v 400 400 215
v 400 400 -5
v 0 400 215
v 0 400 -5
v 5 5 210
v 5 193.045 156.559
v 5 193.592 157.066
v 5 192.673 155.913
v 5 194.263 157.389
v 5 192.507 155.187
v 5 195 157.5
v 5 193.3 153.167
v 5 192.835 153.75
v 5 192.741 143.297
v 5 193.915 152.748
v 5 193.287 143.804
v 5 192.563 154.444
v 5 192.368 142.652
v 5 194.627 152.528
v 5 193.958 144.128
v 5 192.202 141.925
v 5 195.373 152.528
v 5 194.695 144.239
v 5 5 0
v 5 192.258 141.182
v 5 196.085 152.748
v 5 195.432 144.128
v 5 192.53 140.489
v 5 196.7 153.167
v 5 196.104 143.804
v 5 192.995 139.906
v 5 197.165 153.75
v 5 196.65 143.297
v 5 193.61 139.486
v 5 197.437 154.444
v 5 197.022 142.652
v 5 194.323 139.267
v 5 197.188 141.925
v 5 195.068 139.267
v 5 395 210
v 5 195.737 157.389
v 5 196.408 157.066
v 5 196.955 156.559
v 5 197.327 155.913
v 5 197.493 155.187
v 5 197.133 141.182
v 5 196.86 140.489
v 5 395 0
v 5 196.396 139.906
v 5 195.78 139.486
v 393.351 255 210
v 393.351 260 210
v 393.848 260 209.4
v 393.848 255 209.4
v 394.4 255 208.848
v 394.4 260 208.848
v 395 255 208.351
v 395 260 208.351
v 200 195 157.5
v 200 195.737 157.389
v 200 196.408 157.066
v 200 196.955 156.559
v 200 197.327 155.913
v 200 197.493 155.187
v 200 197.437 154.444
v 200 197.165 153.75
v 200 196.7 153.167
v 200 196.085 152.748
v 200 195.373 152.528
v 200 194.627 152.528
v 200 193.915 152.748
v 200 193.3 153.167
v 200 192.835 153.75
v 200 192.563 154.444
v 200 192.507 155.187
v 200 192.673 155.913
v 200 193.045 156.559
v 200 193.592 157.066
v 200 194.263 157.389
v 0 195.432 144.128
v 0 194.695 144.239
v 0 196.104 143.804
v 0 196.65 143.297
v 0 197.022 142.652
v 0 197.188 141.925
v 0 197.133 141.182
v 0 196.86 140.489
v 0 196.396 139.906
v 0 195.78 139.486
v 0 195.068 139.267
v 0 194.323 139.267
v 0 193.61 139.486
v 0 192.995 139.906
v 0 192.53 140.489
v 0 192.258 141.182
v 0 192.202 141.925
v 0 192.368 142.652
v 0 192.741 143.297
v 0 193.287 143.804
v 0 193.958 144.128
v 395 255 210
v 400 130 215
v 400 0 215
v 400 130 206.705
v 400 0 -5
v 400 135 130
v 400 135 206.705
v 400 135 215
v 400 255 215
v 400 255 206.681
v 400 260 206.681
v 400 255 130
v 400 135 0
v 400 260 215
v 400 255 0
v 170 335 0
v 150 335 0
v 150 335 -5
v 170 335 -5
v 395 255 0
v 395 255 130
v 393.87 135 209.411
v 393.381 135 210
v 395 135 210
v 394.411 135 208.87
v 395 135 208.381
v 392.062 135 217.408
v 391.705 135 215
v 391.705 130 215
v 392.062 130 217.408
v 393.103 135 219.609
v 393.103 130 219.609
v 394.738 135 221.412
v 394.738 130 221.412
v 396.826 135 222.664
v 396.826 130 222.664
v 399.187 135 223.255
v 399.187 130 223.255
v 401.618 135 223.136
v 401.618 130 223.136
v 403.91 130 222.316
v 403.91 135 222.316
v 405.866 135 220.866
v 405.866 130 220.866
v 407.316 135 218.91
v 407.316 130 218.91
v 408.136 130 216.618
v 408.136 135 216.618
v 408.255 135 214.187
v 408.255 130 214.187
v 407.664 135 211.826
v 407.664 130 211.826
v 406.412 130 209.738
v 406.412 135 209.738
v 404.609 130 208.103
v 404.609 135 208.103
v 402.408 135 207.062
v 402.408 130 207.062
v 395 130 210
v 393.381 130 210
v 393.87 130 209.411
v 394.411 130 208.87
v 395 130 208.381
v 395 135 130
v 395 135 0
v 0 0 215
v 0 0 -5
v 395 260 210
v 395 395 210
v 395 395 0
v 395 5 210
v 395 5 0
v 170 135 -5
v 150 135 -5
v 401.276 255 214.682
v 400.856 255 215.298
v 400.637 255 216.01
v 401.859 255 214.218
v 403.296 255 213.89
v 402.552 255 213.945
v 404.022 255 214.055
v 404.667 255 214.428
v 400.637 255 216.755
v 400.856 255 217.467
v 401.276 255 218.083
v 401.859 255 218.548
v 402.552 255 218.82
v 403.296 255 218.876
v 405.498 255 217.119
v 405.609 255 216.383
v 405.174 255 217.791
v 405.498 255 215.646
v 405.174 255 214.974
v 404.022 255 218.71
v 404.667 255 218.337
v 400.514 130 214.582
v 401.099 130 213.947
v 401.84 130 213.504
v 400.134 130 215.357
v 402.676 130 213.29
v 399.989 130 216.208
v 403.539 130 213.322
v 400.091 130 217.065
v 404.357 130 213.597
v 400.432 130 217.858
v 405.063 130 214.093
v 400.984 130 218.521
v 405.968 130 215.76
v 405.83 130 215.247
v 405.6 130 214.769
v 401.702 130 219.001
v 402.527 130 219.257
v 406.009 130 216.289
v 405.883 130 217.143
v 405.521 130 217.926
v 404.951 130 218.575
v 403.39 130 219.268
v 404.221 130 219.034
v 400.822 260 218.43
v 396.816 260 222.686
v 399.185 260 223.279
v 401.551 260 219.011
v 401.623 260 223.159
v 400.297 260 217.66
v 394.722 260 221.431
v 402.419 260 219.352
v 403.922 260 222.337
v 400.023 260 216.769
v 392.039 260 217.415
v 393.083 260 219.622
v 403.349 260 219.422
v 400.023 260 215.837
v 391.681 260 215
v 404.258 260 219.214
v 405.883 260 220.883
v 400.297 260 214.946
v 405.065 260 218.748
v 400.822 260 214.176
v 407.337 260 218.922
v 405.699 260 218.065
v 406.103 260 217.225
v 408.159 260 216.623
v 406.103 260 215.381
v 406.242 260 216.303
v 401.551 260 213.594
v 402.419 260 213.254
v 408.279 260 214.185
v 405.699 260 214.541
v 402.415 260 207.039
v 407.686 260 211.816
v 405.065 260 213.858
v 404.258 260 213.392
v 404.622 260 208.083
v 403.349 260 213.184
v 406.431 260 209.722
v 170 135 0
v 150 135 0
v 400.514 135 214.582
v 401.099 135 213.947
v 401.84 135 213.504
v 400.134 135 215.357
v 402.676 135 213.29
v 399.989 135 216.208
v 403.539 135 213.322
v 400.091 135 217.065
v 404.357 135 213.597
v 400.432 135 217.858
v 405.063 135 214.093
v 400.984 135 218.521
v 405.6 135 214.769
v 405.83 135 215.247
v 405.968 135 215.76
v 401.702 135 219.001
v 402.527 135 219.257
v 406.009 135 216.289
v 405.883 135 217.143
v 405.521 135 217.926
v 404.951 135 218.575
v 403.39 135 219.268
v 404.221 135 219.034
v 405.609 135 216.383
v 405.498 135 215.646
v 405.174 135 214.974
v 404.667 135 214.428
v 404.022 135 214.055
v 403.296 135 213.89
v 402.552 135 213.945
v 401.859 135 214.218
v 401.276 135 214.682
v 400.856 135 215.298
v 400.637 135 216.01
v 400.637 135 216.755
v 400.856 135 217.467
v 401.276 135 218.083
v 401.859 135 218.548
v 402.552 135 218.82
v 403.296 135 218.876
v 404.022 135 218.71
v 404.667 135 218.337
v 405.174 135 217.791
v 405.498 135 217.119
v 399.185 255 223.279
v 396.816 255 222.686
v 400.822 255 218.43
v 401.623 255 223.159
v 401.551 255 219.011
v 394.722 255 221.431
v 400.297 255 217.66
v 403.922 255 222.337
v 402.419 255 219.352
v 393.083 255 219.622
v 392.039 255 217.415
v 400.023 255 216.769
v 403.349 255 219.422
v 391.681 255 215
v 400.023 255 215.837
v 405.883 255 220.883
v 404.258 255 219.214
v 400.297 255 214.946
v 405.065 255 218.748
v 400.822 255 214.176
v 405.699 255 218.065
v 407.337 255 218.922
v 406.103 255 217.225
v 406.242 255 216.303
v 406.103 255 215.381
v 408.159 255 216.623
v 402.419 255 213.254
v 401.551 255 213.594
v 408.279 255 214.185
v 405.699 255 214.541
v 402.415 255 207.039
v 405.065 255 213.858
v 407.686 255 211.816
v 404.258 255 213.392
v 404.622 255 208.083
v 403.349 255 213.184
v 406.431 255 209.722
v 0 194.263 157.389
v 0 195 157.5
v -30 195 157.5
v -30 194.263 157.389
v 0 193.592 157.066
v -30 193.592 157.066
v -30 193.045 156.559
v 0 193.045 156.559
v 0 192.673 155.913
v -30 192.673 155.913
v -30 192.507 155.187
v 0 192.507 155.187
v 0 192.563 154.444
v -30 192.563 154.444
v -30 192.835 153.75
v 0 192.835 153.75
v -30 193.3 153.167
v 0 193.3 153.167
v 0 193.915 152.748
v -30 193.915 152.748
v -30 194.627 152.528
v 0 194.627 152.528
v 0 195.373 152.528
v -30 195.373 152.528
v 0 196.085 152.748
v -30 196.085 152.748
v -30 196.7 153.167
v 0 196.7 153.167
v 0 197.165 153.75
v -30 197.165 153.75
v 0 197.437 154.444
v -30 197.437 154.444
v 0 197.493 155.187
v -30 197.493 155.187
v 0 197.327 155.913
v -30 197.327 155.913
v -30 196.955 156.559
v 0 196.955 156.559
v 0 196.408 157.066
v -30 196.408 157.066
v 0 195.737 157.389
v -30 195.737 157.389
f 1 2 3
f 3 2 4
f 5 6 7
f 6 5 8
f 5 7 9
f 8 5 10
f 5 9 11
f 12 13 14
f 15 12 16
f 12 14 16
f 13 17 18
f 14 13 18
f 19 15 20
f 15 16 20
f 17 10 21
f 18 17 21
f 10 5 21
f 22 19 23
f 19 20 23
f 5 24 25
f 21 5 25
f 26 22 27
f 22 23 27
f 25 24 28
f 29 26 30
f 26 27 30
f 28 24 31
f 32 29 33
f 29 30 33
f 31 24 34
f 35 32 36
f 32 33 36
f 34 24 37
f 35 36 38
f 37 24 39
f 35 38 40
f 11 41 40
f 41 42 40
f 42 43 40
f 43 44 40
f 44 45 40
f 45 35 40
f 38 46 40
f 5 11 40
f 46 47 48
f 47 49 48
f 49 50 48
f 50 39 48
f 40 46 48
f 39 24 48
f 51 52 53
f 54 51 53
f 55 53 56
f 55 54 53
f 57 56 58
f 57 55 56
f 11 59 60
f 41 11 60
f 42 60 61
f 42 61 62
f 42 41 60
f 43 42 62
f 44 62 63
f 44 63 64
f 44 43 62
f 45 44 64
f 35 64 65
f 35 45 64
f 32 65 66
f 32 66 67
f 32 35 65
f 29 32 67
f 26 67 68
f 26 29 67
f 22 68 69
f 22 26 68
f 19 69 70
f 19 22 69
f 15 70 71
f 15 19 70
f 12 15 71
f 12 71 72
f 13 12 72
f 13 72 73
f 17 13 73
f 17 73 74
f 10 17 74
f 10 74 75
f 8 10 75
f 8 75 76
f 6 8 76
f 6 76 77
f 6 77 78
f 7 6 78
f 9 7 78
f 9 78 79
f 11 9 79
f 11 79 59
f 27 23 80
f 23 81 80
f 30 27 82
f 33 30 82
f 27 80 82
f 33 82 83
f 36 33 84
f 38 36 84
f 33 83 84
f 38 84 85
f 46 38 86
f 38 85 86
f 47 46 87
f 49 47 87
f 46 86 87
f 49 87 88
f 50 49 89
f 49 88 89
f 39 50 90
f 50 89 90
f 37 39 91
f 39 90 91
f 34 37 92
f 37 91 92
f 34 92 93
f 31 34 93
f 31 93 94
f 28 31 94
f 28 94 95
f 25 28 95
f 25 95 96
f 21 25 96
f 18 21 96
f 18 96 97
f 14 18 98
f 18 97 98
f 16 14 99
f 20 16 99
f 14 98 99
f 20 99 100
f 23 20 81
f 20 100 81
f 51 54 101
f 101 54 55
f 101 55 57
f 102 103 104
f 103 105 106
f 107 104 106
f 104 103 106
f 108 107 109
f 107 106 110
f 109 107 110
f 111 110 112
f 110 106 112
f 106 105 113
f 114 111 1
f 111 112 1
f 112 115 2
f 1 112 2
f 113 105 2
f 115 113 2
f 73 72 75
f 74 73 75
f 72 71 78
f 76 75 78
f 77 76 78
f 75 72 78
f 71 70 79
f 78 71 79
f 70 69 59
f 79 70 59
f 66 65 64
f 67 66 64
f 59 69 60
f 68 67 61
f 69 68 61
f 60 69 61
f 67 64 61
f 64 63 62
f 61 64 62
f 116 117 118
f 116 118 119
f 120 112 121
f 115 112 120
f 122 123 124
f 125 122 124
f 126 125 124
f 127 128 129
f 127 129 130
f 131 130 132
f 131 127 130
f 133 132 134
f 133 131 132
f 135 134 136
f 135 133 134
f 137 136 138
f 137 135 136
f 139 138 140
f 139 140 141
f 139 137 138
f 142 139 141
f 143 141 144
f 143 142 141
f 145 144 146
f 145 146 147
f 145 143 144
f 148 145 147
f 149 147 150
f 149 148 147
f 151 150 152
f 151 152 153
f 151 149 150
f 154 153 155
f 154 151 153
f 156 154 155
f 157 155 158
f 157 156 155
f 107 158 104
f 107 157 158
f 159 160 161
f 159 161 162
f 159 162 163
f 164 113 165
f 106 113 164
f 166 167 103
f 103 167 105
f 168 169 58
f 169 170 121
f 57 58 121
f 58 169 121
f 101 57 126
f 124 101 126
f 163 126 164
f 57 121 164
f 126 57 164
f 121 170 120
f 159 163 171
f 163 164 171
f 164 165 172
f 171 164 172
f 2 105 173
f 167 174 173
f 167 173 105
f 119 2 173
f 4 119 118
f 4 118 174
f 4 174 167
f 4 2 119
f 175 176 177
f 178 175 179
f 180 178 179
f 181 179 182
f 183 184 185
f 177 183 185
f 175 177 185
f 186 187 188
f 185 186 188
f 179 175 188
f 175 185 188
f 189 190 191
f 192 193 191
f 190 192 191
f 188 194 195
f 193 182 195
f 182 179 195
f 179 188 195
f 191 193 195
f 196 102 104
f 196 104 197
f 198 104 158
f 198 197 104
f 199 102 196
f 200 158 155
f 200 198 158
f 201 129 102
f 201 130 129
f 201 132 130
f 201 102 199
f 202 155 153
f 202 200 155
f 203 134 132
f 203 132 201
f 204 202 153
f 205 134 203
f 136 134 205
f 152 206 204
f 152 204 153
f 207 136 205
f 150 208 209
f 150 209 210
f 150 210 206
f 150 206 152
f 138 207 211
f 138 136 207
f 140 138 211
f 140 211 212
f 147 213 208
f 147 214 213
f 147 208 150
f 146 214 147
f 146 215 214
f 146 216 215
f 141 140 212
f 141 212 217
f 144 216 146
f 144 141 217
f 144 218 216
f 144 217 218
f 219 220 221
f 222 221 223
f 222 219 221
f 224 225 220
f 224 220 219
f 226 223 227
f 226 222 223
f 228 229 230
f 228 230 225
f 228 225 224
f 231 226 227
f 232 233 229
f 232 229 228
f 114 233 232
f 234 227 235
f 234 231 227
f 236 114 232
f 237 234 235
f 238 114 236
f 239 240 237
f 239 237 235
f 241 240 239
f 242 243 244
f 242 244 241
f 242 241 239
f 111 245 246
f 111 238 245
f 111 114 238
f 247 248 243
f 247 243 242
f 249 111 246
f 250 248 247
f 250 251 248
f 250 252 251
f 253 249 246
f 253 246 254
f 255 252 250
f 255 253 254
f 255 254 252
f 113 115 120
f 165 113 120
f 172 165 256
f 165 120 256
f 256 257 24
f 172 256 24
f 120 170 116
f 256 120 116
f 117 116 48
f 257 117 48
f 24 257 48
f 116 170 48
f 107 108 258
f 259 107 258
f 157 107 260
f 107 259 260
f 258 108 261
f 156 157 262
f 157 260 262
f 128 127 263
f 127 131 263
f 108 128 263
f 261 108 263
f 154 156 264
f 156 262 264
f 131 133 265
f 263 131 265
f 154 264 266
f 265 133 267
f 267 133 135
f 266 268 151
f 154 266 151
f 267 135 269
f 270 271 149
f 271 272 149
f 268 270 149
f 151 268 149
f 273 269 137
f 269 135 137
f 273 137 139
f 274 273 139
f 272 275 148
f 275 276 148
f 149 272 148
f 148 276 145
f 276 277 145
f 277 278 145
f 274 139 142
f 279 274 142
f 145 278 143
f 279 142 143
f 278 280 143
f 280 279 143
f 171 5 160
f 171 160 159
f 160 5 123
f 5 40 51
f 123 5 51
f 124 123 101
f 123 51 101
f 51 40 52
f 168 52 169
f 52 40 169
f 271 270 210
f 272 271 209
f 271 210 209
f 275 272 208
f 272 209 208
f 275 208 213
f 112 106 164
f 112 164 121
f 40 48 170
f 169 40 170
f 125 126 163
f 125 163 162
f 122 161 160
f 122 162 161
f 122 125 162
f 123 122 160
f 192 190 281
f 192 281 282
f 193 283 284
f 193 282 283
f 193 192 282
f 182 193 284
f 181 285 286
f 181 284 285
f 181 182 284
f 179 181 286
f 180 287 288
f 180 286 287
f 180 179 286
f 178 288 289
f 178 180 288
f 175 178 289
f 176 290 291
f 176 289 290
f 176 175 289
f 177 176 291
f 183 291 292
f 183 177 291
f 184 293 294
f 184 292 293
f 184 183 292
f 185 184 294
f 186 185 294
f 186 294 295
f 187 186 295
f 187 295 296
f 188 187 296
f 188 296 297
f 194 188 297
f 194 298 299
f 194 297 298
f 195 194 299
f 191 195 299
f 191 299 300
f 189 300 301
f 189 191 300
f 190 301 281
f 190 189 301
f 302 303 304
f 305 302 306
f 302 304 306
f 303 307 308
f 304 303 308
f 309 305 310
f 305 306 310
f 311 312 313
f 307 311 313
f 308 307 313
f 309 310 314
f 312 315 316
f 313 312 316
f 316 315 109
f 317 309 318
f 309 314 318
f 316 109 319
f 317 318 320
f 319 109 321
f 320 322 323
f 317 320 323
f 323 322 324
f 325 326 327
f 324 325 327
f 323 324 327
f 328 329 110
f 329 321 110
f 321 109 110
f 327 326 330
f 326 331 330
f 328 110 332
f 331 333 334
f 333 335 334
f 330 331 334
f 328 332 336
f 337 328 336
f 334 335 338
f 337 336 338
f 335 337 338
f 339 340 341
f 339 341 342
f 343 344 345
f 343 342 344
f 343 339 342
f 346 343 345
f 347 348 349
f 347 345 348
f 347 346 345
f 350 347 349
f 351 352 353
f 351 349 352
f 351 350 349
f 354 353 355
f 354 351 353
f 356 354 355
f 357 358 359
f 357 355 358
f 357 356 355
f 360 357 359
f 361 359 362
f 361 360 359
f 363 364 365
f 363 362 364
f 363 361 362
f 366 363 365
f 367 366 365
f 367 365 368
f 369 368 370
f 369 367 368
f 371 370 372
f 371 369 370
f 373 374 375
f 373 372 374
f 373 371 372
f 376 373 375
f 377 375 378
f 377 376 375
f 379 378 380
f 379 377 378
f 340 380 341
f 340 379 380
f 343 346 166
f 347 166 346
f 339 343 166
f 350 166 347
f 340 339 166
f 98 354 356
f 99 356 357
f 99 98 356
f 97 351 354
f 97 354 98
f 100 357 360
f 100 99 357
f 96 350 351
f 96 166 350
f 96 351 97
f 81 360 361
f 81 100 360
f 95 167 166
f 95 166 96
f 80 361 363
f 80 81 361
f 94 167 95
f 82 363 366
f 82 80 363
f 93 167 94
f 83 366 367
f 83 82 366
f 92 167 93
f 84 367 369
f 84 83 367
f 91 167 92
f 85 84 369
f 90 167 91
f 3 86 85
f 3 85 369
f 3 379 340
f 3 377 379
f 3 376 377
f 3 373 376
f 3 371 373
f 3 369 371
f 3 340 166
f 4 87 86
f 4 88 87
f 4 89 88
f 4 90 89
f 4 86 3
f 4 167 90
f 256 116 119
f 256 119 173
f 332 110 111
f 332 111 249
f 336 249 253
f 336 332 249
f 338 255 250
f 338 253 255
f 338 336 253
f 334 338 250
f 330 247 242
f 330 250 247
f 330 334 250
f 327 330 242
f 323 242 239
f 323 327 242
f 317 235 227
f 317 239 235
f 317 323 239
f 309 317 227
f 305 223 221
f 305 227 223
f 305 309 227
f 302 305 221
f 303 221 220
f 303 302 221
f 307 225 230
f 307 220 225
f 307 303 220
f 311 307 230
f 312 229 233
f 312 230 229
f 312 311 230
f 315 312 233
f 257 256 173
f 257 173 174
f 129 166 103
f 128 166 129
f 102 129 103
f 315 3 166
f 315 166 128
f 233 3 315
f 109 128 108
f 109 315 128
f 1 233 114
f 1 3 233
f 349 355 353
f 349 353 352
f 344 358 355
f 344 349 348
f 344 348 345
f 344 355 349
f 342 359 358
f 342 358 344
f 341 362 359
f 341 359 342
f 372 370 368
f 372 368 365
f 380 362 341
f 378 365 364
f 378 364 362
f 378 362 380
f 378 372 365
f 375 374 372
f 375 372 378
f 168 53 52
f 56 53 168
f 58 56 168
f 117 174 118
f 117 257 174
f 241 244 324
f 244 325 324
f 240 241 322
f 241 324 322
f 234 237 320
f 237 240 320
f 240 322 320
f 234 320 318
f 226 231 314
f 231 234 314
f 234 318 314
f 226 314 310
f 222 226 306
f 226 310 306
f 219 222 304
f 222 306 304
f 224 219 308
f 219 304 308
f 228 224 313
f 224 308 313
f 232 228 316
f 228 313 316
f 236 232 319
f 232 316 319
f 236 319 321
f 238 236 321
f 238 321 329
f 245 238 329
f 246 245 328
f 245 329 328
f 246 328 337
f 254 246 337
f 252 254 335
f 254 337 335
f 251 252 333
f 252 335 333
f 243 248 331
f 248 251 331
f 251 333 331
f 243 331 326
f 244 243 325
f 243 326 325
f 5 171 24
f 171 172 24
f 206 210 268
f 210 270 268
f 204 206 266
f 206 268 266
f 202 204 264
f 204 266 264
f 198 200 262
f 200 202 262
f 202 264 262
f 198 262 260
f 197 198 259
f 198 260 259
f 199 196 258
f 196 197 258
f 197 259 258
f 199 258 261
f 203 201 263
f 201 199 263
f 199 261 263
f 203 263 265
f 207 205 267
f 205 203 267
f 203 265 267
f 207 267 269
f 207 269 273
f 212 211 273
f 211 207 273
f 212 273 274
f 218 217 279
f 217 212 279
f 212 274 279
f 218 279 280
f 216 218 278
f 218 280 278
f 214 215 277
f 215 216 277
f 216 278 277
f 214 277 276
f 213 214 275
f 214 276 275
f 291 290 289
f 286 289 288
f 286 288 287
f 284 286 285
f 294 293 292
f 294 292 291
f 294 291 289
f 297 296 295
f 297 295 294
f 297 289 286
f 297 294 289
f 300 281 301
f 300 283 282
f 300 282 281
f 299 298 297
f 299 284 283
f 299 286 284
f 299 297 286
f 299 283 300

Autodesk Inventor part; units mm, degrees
ref_plane "YZ Plane" through (0, 0, 0) normal (1, 0, 0) x (0, 1, 0)
ref_plane "XZ Plane" through (0, 0, 0) normal (0, 1, 0) x (-1, 0, 0)
ref_plane "XY Plane" through (0, 0, 0) normal (0, 0, 1) x (1, 0, 0)
sketch "Sketch1" plane through (0, 0, 0) normal (0, 0, 1) x (1, 0, 0)
  line L0 (0, 0) -> (400, 0)
  line L1 (400, 0) -> (400, 400)
  line L2 (400, 400) -> (0, 400)
  line L3 (0, 400) -> (0, 0)
  line L4 (5, 5) -> (395, 5)
  line L5 (395, 5) -> (395, 395)
  line L6 (395, 395) -> (5, 395)
  line L7 (5, 395) -> (5, 5)
  dimension "d0" = 400
  dimension "d1" = 400
  dimension "d2" = 390
  dimension "d3" = 390
extrude "Extrusion1" add sketch "Sketch1" along normal blind 170
sketch "Sketch2" plane through (0, 0, 170) normal (0, 0, 1) x (1, 0, 0)
  line L0 (400, 0) -> (400, 400) projected
  line L1 (0, 0) -> (400, 0)
  line L2 (400, 0) -> (400, 400)
  line L3 (400, 400) -> (0, 400)
  line L4 (0, 400) -> (0, 0)
extrude "Extrusion2" add sketch "Sketch2" along normal blind 5
sketch "Sketch3" plane through (400, 0, 0) normal (1, 0, 0) x (0, 0, -1)
  line L0 (0, 0) -> (0, 400) projected
  line L1 (0, 140) -> (-130, 140)
  line L2 (-130, 140) -> (-130, 250)
  line L3 (-130, 250) -> (0, 250)
  line L4 (0, 250) -> (0, 140)
  dimension "d8" = 130
  dimension "d9" = 110
extrude "Extrusion3" cut sketch "Sketch3" against normal blind 5
sketch "Sketch4" plane through (400, 0, 175) normal (1, 0, 0) x (0, 0, -1)
  line L0 (45, 250) -> (45, 140) projected
  line L1 (175, 140) -> (175, 5) projected
  line L2 (45, 140) -> (175, 140)
  line L3 (175, 140) -> (175, 135)
  line L4 (175, 135) -> (45, 135)
  line L5 (45, 135) -> (45, 140)
  line L6 (175, 250) -> (45, 250) projected
  line L7 (175, 250) -> (45, 250)
  line L8 (45, 250) -> (45, 255)
  line L9 (45, 255) -> (175, 255)
  line L10 (175, 255) -> (175, 250)
  point P0 (175, 0)
  dimension "d12" = 5
  dimension "d13" = 5
extrude "Extrusion4" cut sketch "Sketch4" against normal blind 5
sketch "Sketch5" plane through (0, 0, 0) normal (0, 0, -1) x (-1, 0, 0)
  line L0 (-400, 255) -> (-400, 400) projected
  line L1 (0, 0) -> (-400, 0)
  line L2 (-400, 0) -> (-400, 400)
  line L3 (-400, 400) -> (0, 400)
  line L4 (0, 400) -> (0, 0)
  line L5 (-170, 135) -> (-150, 135)
  line L6 (-150, 135) -> (-150, 335)
  line L7 (-150, 335) -> (-170, 335)
  line L8 (-170, 335) -> (-170, 135)
  dimension "d16" = 20
  dimension "d17" = 200
extrude "Extrusion5" add sketch "Sketch5" along normal blind 5
sketch "Sketch6" plane through (0, 0, 175) normal (-1, 0, 0) x (0, 0, 1)
  circle A0 centre (-20, 195) radius 2.5
  point P0 (-175, 0)
  dimension "d20" = 5
extrude "Extrusion6" cut sketch "Sketch6" against normal blind 220
sketch "Sketch7" plane through (0, 0, 175) normal (-1, 0, 0) x (0, 0, 1)
  circle A0 centre (-20, 195) radius 2.5 projected
  circle A1 centre (-20, 195) radius 2.5
  point P0 (-175, 0)
extrude "Extrusion7" add sketch "Sketch7" against normal blind 200
sketch "Sketch8" plane through (0, 0, 175) normal (-1, 0, 0) x (0, 0, 1)
  circle A0 centre (-20, 195) radius 2.5 projected
  circle A1 centre (-20, 195) radius 2.5
  point P0 (-175, 0)
extrude "Extrusion8" add sketch "Sketch8" along normal blind 30
sketch "Sketch9" plane through (150, 135, 0) normal (1, 0, 0) x (0, 0, -1)
  point P0 (0, -135)
sketch "Sketch10" plane through (150, 135, 0) normal (1, 0, 0) x (0, 0, -1)
  point P0 (0, -135)
sketch "Sketch11" plane through (0, 0, 175) normal (-1, 0, 0) x (0, 0, 1)
  circle A0 centre (-32.5584, 194.9375) radius 2.5
  circle A1 centre (-20, 195) radius 2.5 projected
  circle A2 centre (-20, 195) radius 2.5
  point P0 (-175, 0)
  dimension "d27" = 5
  dimension "d28" = 5
extrude "Extrusion9" add sketch "Sketch11" against normal blind 200 contours A1
sketch "Sketch12" plane through (0, 0, 175) normal (-1, 0, 0) x (0, 0, 1)
  circle A0 centre (-33.2614, 194.6952) radius 2.5
  point P0 (-175, 0)
  dimension "d31" = 5
extrude "Extrusion10" cut sketch "Sketch12" against normal blind 200
sketch "Sketch13" plane through (0, 0, 175) normal (0, 0, 1) x (1, 0, 0)
  point P0 (0, 0)
sketch "Sketch14" plane through (0, 0, 175) normal (0, 0, 1) x (1, 0, 0)
  line L0 (400, 0) -> (0, 0) projected
  line L1 (400, 0) -> (0, 0)
  line L2 (0, 0) -> (0, 400)
  line L3 (0, 400) -> (400, 400)
  line L4 (400, 400) -> (400, 0)
extrude "Extrusion11" cut sketch "Sketch14" against normal blind 5
sketch "Sketch15" plane through (0, 0, 170) normal (0, 0, 1) x (1, 0, 0)
  line L0 (0, 0) -> (0, 400) projected
  line L1 (400, 0) -> (0, 0)
  line L2 (0, 0) -> (0, 400)
  line L3 (0, 400) -> (400, 400)
  line L4 (400, 400) -> (400, 0)
  line L5 (5, 395) -> (395, 395) projected
  line L6 (395, 395) -> (395, 5) projected
  line L7 (5, 395) -> (395, 395)
  line L8 (395, 395) -> (395, 5)
  line L9 (395, 5) -> (5, 5)
  line L10 (5, 5) -> (5, 395)
extrude "Extrusion12" add sketch "Sketch15" along normal blind 40
sketch "Sketch16" plane through (0, 0, 210) normal (0, 0, 1) x (1, 0, 0)
  line L0 (0, 0) -> (0, 400) projected
  line L1 (0, 400) -> (400, 400) projected
  line L2 (0, 0) -> (400, 0)
  line L3 (400, 0) -> (400, 400)
  line L4 (400, 400) -> (0, 400)
  line L5 (0, 400) -> (0, 0)
extrude "Extrusion13" add sketch "Sketch16" along normal blind 5
ref_plane "Work Plane3" through (0, 135, -5) normal (0, -1, 0) x (1, 0, 0)
sketch "Sketch17" plane through (0, 135, -5) normal (0, -1, 0) x (1, 0, 0)
  line L0 (0, 220) -> (400, 220) projected
  circle A0 centre (400, 220) radius 8.2953
  circle A1 centre (402.9982, 221.2832) radius 3.0106
  point P0 (0, 5)
extrude "Extrusion14" add sketch "Sketch17" along normal blind 5
ref_plane "Work Plane4" through (0, 255, -5) normal (0, 1, 0) x (1, 0, 0)
sketch "Sketch18" plane through (0, 255, -5) normal (0, 1, 0) x (1, 0, 0)
  line L0 (400, -220) -> (400, 0) projected
  circle A0 centre (400, -220) radius 8.3192
  circle A1 centre (403.115, -221.3029) radius 3.1274
  point P0 (0, -5)
extrude "Extrusion15" add sketch "Sketch18" along normal blind 5
sketch "Sketch19" plane through (0, 0, 215) normal (0, 0, 1) x (1, 0, 0)
  line L0 (400, 400) -> (0, 400) projected
  line L1 (0, 0) -> (400, 0)
  line L2 (400, 0) -> (400, 400)
  line L3 (400, 400) -> (0, 400)
  line L4 (0, 400) -> (0, 0)
extrude "Extrusion16" cut sketch "Sketch19" against normal blind 5
sketch "Sketch20" plane through (0, 130, -5) normal (0, -1, 0) x (1, 0, 0)
  circle A0 centre (403.1559, 221.2408) radius 2.8533
  point P0 (0, 5)
extrude "Extrusion17" cut sketch "Sketch20" against normal blind 130
sketch "Sketch21" plane through (0, 255, -5) normal (0, -1, 0) x (1, 0, 0)
  circle A0 centre (403.1087, 221.3826) radius 2.5
  point P0 (0, 5)
  dimension "d50" = 5
extrude "Extrusion18" add sketch "Sketch21" along normal blind 120
sketch "Sketch22" plane through (0, 0, 210) normal (0, 0, 1) x (1, 0, 0)
  point P0 (0, 0)
sketch "Sketch23" plane through (0, 0, 210) normal (0, 0, 1) x (1, 0, 0)
  line L0 (0, 0) -> (0, 400) projected
  line L1 (400, 400) -> (400, 260) projected
  line L2 (0, 0) -> (400, 0)
  line L3 (400, 0) -> (400, 400)
  line L4 (400, 400) -> (0, 400)
  line L5 (0, 400) -> (0, 0)
extrude "Extrusion19" add sketch "Sketch23" along normal blind 5
properties part number "DSN 1" material "Glass"
